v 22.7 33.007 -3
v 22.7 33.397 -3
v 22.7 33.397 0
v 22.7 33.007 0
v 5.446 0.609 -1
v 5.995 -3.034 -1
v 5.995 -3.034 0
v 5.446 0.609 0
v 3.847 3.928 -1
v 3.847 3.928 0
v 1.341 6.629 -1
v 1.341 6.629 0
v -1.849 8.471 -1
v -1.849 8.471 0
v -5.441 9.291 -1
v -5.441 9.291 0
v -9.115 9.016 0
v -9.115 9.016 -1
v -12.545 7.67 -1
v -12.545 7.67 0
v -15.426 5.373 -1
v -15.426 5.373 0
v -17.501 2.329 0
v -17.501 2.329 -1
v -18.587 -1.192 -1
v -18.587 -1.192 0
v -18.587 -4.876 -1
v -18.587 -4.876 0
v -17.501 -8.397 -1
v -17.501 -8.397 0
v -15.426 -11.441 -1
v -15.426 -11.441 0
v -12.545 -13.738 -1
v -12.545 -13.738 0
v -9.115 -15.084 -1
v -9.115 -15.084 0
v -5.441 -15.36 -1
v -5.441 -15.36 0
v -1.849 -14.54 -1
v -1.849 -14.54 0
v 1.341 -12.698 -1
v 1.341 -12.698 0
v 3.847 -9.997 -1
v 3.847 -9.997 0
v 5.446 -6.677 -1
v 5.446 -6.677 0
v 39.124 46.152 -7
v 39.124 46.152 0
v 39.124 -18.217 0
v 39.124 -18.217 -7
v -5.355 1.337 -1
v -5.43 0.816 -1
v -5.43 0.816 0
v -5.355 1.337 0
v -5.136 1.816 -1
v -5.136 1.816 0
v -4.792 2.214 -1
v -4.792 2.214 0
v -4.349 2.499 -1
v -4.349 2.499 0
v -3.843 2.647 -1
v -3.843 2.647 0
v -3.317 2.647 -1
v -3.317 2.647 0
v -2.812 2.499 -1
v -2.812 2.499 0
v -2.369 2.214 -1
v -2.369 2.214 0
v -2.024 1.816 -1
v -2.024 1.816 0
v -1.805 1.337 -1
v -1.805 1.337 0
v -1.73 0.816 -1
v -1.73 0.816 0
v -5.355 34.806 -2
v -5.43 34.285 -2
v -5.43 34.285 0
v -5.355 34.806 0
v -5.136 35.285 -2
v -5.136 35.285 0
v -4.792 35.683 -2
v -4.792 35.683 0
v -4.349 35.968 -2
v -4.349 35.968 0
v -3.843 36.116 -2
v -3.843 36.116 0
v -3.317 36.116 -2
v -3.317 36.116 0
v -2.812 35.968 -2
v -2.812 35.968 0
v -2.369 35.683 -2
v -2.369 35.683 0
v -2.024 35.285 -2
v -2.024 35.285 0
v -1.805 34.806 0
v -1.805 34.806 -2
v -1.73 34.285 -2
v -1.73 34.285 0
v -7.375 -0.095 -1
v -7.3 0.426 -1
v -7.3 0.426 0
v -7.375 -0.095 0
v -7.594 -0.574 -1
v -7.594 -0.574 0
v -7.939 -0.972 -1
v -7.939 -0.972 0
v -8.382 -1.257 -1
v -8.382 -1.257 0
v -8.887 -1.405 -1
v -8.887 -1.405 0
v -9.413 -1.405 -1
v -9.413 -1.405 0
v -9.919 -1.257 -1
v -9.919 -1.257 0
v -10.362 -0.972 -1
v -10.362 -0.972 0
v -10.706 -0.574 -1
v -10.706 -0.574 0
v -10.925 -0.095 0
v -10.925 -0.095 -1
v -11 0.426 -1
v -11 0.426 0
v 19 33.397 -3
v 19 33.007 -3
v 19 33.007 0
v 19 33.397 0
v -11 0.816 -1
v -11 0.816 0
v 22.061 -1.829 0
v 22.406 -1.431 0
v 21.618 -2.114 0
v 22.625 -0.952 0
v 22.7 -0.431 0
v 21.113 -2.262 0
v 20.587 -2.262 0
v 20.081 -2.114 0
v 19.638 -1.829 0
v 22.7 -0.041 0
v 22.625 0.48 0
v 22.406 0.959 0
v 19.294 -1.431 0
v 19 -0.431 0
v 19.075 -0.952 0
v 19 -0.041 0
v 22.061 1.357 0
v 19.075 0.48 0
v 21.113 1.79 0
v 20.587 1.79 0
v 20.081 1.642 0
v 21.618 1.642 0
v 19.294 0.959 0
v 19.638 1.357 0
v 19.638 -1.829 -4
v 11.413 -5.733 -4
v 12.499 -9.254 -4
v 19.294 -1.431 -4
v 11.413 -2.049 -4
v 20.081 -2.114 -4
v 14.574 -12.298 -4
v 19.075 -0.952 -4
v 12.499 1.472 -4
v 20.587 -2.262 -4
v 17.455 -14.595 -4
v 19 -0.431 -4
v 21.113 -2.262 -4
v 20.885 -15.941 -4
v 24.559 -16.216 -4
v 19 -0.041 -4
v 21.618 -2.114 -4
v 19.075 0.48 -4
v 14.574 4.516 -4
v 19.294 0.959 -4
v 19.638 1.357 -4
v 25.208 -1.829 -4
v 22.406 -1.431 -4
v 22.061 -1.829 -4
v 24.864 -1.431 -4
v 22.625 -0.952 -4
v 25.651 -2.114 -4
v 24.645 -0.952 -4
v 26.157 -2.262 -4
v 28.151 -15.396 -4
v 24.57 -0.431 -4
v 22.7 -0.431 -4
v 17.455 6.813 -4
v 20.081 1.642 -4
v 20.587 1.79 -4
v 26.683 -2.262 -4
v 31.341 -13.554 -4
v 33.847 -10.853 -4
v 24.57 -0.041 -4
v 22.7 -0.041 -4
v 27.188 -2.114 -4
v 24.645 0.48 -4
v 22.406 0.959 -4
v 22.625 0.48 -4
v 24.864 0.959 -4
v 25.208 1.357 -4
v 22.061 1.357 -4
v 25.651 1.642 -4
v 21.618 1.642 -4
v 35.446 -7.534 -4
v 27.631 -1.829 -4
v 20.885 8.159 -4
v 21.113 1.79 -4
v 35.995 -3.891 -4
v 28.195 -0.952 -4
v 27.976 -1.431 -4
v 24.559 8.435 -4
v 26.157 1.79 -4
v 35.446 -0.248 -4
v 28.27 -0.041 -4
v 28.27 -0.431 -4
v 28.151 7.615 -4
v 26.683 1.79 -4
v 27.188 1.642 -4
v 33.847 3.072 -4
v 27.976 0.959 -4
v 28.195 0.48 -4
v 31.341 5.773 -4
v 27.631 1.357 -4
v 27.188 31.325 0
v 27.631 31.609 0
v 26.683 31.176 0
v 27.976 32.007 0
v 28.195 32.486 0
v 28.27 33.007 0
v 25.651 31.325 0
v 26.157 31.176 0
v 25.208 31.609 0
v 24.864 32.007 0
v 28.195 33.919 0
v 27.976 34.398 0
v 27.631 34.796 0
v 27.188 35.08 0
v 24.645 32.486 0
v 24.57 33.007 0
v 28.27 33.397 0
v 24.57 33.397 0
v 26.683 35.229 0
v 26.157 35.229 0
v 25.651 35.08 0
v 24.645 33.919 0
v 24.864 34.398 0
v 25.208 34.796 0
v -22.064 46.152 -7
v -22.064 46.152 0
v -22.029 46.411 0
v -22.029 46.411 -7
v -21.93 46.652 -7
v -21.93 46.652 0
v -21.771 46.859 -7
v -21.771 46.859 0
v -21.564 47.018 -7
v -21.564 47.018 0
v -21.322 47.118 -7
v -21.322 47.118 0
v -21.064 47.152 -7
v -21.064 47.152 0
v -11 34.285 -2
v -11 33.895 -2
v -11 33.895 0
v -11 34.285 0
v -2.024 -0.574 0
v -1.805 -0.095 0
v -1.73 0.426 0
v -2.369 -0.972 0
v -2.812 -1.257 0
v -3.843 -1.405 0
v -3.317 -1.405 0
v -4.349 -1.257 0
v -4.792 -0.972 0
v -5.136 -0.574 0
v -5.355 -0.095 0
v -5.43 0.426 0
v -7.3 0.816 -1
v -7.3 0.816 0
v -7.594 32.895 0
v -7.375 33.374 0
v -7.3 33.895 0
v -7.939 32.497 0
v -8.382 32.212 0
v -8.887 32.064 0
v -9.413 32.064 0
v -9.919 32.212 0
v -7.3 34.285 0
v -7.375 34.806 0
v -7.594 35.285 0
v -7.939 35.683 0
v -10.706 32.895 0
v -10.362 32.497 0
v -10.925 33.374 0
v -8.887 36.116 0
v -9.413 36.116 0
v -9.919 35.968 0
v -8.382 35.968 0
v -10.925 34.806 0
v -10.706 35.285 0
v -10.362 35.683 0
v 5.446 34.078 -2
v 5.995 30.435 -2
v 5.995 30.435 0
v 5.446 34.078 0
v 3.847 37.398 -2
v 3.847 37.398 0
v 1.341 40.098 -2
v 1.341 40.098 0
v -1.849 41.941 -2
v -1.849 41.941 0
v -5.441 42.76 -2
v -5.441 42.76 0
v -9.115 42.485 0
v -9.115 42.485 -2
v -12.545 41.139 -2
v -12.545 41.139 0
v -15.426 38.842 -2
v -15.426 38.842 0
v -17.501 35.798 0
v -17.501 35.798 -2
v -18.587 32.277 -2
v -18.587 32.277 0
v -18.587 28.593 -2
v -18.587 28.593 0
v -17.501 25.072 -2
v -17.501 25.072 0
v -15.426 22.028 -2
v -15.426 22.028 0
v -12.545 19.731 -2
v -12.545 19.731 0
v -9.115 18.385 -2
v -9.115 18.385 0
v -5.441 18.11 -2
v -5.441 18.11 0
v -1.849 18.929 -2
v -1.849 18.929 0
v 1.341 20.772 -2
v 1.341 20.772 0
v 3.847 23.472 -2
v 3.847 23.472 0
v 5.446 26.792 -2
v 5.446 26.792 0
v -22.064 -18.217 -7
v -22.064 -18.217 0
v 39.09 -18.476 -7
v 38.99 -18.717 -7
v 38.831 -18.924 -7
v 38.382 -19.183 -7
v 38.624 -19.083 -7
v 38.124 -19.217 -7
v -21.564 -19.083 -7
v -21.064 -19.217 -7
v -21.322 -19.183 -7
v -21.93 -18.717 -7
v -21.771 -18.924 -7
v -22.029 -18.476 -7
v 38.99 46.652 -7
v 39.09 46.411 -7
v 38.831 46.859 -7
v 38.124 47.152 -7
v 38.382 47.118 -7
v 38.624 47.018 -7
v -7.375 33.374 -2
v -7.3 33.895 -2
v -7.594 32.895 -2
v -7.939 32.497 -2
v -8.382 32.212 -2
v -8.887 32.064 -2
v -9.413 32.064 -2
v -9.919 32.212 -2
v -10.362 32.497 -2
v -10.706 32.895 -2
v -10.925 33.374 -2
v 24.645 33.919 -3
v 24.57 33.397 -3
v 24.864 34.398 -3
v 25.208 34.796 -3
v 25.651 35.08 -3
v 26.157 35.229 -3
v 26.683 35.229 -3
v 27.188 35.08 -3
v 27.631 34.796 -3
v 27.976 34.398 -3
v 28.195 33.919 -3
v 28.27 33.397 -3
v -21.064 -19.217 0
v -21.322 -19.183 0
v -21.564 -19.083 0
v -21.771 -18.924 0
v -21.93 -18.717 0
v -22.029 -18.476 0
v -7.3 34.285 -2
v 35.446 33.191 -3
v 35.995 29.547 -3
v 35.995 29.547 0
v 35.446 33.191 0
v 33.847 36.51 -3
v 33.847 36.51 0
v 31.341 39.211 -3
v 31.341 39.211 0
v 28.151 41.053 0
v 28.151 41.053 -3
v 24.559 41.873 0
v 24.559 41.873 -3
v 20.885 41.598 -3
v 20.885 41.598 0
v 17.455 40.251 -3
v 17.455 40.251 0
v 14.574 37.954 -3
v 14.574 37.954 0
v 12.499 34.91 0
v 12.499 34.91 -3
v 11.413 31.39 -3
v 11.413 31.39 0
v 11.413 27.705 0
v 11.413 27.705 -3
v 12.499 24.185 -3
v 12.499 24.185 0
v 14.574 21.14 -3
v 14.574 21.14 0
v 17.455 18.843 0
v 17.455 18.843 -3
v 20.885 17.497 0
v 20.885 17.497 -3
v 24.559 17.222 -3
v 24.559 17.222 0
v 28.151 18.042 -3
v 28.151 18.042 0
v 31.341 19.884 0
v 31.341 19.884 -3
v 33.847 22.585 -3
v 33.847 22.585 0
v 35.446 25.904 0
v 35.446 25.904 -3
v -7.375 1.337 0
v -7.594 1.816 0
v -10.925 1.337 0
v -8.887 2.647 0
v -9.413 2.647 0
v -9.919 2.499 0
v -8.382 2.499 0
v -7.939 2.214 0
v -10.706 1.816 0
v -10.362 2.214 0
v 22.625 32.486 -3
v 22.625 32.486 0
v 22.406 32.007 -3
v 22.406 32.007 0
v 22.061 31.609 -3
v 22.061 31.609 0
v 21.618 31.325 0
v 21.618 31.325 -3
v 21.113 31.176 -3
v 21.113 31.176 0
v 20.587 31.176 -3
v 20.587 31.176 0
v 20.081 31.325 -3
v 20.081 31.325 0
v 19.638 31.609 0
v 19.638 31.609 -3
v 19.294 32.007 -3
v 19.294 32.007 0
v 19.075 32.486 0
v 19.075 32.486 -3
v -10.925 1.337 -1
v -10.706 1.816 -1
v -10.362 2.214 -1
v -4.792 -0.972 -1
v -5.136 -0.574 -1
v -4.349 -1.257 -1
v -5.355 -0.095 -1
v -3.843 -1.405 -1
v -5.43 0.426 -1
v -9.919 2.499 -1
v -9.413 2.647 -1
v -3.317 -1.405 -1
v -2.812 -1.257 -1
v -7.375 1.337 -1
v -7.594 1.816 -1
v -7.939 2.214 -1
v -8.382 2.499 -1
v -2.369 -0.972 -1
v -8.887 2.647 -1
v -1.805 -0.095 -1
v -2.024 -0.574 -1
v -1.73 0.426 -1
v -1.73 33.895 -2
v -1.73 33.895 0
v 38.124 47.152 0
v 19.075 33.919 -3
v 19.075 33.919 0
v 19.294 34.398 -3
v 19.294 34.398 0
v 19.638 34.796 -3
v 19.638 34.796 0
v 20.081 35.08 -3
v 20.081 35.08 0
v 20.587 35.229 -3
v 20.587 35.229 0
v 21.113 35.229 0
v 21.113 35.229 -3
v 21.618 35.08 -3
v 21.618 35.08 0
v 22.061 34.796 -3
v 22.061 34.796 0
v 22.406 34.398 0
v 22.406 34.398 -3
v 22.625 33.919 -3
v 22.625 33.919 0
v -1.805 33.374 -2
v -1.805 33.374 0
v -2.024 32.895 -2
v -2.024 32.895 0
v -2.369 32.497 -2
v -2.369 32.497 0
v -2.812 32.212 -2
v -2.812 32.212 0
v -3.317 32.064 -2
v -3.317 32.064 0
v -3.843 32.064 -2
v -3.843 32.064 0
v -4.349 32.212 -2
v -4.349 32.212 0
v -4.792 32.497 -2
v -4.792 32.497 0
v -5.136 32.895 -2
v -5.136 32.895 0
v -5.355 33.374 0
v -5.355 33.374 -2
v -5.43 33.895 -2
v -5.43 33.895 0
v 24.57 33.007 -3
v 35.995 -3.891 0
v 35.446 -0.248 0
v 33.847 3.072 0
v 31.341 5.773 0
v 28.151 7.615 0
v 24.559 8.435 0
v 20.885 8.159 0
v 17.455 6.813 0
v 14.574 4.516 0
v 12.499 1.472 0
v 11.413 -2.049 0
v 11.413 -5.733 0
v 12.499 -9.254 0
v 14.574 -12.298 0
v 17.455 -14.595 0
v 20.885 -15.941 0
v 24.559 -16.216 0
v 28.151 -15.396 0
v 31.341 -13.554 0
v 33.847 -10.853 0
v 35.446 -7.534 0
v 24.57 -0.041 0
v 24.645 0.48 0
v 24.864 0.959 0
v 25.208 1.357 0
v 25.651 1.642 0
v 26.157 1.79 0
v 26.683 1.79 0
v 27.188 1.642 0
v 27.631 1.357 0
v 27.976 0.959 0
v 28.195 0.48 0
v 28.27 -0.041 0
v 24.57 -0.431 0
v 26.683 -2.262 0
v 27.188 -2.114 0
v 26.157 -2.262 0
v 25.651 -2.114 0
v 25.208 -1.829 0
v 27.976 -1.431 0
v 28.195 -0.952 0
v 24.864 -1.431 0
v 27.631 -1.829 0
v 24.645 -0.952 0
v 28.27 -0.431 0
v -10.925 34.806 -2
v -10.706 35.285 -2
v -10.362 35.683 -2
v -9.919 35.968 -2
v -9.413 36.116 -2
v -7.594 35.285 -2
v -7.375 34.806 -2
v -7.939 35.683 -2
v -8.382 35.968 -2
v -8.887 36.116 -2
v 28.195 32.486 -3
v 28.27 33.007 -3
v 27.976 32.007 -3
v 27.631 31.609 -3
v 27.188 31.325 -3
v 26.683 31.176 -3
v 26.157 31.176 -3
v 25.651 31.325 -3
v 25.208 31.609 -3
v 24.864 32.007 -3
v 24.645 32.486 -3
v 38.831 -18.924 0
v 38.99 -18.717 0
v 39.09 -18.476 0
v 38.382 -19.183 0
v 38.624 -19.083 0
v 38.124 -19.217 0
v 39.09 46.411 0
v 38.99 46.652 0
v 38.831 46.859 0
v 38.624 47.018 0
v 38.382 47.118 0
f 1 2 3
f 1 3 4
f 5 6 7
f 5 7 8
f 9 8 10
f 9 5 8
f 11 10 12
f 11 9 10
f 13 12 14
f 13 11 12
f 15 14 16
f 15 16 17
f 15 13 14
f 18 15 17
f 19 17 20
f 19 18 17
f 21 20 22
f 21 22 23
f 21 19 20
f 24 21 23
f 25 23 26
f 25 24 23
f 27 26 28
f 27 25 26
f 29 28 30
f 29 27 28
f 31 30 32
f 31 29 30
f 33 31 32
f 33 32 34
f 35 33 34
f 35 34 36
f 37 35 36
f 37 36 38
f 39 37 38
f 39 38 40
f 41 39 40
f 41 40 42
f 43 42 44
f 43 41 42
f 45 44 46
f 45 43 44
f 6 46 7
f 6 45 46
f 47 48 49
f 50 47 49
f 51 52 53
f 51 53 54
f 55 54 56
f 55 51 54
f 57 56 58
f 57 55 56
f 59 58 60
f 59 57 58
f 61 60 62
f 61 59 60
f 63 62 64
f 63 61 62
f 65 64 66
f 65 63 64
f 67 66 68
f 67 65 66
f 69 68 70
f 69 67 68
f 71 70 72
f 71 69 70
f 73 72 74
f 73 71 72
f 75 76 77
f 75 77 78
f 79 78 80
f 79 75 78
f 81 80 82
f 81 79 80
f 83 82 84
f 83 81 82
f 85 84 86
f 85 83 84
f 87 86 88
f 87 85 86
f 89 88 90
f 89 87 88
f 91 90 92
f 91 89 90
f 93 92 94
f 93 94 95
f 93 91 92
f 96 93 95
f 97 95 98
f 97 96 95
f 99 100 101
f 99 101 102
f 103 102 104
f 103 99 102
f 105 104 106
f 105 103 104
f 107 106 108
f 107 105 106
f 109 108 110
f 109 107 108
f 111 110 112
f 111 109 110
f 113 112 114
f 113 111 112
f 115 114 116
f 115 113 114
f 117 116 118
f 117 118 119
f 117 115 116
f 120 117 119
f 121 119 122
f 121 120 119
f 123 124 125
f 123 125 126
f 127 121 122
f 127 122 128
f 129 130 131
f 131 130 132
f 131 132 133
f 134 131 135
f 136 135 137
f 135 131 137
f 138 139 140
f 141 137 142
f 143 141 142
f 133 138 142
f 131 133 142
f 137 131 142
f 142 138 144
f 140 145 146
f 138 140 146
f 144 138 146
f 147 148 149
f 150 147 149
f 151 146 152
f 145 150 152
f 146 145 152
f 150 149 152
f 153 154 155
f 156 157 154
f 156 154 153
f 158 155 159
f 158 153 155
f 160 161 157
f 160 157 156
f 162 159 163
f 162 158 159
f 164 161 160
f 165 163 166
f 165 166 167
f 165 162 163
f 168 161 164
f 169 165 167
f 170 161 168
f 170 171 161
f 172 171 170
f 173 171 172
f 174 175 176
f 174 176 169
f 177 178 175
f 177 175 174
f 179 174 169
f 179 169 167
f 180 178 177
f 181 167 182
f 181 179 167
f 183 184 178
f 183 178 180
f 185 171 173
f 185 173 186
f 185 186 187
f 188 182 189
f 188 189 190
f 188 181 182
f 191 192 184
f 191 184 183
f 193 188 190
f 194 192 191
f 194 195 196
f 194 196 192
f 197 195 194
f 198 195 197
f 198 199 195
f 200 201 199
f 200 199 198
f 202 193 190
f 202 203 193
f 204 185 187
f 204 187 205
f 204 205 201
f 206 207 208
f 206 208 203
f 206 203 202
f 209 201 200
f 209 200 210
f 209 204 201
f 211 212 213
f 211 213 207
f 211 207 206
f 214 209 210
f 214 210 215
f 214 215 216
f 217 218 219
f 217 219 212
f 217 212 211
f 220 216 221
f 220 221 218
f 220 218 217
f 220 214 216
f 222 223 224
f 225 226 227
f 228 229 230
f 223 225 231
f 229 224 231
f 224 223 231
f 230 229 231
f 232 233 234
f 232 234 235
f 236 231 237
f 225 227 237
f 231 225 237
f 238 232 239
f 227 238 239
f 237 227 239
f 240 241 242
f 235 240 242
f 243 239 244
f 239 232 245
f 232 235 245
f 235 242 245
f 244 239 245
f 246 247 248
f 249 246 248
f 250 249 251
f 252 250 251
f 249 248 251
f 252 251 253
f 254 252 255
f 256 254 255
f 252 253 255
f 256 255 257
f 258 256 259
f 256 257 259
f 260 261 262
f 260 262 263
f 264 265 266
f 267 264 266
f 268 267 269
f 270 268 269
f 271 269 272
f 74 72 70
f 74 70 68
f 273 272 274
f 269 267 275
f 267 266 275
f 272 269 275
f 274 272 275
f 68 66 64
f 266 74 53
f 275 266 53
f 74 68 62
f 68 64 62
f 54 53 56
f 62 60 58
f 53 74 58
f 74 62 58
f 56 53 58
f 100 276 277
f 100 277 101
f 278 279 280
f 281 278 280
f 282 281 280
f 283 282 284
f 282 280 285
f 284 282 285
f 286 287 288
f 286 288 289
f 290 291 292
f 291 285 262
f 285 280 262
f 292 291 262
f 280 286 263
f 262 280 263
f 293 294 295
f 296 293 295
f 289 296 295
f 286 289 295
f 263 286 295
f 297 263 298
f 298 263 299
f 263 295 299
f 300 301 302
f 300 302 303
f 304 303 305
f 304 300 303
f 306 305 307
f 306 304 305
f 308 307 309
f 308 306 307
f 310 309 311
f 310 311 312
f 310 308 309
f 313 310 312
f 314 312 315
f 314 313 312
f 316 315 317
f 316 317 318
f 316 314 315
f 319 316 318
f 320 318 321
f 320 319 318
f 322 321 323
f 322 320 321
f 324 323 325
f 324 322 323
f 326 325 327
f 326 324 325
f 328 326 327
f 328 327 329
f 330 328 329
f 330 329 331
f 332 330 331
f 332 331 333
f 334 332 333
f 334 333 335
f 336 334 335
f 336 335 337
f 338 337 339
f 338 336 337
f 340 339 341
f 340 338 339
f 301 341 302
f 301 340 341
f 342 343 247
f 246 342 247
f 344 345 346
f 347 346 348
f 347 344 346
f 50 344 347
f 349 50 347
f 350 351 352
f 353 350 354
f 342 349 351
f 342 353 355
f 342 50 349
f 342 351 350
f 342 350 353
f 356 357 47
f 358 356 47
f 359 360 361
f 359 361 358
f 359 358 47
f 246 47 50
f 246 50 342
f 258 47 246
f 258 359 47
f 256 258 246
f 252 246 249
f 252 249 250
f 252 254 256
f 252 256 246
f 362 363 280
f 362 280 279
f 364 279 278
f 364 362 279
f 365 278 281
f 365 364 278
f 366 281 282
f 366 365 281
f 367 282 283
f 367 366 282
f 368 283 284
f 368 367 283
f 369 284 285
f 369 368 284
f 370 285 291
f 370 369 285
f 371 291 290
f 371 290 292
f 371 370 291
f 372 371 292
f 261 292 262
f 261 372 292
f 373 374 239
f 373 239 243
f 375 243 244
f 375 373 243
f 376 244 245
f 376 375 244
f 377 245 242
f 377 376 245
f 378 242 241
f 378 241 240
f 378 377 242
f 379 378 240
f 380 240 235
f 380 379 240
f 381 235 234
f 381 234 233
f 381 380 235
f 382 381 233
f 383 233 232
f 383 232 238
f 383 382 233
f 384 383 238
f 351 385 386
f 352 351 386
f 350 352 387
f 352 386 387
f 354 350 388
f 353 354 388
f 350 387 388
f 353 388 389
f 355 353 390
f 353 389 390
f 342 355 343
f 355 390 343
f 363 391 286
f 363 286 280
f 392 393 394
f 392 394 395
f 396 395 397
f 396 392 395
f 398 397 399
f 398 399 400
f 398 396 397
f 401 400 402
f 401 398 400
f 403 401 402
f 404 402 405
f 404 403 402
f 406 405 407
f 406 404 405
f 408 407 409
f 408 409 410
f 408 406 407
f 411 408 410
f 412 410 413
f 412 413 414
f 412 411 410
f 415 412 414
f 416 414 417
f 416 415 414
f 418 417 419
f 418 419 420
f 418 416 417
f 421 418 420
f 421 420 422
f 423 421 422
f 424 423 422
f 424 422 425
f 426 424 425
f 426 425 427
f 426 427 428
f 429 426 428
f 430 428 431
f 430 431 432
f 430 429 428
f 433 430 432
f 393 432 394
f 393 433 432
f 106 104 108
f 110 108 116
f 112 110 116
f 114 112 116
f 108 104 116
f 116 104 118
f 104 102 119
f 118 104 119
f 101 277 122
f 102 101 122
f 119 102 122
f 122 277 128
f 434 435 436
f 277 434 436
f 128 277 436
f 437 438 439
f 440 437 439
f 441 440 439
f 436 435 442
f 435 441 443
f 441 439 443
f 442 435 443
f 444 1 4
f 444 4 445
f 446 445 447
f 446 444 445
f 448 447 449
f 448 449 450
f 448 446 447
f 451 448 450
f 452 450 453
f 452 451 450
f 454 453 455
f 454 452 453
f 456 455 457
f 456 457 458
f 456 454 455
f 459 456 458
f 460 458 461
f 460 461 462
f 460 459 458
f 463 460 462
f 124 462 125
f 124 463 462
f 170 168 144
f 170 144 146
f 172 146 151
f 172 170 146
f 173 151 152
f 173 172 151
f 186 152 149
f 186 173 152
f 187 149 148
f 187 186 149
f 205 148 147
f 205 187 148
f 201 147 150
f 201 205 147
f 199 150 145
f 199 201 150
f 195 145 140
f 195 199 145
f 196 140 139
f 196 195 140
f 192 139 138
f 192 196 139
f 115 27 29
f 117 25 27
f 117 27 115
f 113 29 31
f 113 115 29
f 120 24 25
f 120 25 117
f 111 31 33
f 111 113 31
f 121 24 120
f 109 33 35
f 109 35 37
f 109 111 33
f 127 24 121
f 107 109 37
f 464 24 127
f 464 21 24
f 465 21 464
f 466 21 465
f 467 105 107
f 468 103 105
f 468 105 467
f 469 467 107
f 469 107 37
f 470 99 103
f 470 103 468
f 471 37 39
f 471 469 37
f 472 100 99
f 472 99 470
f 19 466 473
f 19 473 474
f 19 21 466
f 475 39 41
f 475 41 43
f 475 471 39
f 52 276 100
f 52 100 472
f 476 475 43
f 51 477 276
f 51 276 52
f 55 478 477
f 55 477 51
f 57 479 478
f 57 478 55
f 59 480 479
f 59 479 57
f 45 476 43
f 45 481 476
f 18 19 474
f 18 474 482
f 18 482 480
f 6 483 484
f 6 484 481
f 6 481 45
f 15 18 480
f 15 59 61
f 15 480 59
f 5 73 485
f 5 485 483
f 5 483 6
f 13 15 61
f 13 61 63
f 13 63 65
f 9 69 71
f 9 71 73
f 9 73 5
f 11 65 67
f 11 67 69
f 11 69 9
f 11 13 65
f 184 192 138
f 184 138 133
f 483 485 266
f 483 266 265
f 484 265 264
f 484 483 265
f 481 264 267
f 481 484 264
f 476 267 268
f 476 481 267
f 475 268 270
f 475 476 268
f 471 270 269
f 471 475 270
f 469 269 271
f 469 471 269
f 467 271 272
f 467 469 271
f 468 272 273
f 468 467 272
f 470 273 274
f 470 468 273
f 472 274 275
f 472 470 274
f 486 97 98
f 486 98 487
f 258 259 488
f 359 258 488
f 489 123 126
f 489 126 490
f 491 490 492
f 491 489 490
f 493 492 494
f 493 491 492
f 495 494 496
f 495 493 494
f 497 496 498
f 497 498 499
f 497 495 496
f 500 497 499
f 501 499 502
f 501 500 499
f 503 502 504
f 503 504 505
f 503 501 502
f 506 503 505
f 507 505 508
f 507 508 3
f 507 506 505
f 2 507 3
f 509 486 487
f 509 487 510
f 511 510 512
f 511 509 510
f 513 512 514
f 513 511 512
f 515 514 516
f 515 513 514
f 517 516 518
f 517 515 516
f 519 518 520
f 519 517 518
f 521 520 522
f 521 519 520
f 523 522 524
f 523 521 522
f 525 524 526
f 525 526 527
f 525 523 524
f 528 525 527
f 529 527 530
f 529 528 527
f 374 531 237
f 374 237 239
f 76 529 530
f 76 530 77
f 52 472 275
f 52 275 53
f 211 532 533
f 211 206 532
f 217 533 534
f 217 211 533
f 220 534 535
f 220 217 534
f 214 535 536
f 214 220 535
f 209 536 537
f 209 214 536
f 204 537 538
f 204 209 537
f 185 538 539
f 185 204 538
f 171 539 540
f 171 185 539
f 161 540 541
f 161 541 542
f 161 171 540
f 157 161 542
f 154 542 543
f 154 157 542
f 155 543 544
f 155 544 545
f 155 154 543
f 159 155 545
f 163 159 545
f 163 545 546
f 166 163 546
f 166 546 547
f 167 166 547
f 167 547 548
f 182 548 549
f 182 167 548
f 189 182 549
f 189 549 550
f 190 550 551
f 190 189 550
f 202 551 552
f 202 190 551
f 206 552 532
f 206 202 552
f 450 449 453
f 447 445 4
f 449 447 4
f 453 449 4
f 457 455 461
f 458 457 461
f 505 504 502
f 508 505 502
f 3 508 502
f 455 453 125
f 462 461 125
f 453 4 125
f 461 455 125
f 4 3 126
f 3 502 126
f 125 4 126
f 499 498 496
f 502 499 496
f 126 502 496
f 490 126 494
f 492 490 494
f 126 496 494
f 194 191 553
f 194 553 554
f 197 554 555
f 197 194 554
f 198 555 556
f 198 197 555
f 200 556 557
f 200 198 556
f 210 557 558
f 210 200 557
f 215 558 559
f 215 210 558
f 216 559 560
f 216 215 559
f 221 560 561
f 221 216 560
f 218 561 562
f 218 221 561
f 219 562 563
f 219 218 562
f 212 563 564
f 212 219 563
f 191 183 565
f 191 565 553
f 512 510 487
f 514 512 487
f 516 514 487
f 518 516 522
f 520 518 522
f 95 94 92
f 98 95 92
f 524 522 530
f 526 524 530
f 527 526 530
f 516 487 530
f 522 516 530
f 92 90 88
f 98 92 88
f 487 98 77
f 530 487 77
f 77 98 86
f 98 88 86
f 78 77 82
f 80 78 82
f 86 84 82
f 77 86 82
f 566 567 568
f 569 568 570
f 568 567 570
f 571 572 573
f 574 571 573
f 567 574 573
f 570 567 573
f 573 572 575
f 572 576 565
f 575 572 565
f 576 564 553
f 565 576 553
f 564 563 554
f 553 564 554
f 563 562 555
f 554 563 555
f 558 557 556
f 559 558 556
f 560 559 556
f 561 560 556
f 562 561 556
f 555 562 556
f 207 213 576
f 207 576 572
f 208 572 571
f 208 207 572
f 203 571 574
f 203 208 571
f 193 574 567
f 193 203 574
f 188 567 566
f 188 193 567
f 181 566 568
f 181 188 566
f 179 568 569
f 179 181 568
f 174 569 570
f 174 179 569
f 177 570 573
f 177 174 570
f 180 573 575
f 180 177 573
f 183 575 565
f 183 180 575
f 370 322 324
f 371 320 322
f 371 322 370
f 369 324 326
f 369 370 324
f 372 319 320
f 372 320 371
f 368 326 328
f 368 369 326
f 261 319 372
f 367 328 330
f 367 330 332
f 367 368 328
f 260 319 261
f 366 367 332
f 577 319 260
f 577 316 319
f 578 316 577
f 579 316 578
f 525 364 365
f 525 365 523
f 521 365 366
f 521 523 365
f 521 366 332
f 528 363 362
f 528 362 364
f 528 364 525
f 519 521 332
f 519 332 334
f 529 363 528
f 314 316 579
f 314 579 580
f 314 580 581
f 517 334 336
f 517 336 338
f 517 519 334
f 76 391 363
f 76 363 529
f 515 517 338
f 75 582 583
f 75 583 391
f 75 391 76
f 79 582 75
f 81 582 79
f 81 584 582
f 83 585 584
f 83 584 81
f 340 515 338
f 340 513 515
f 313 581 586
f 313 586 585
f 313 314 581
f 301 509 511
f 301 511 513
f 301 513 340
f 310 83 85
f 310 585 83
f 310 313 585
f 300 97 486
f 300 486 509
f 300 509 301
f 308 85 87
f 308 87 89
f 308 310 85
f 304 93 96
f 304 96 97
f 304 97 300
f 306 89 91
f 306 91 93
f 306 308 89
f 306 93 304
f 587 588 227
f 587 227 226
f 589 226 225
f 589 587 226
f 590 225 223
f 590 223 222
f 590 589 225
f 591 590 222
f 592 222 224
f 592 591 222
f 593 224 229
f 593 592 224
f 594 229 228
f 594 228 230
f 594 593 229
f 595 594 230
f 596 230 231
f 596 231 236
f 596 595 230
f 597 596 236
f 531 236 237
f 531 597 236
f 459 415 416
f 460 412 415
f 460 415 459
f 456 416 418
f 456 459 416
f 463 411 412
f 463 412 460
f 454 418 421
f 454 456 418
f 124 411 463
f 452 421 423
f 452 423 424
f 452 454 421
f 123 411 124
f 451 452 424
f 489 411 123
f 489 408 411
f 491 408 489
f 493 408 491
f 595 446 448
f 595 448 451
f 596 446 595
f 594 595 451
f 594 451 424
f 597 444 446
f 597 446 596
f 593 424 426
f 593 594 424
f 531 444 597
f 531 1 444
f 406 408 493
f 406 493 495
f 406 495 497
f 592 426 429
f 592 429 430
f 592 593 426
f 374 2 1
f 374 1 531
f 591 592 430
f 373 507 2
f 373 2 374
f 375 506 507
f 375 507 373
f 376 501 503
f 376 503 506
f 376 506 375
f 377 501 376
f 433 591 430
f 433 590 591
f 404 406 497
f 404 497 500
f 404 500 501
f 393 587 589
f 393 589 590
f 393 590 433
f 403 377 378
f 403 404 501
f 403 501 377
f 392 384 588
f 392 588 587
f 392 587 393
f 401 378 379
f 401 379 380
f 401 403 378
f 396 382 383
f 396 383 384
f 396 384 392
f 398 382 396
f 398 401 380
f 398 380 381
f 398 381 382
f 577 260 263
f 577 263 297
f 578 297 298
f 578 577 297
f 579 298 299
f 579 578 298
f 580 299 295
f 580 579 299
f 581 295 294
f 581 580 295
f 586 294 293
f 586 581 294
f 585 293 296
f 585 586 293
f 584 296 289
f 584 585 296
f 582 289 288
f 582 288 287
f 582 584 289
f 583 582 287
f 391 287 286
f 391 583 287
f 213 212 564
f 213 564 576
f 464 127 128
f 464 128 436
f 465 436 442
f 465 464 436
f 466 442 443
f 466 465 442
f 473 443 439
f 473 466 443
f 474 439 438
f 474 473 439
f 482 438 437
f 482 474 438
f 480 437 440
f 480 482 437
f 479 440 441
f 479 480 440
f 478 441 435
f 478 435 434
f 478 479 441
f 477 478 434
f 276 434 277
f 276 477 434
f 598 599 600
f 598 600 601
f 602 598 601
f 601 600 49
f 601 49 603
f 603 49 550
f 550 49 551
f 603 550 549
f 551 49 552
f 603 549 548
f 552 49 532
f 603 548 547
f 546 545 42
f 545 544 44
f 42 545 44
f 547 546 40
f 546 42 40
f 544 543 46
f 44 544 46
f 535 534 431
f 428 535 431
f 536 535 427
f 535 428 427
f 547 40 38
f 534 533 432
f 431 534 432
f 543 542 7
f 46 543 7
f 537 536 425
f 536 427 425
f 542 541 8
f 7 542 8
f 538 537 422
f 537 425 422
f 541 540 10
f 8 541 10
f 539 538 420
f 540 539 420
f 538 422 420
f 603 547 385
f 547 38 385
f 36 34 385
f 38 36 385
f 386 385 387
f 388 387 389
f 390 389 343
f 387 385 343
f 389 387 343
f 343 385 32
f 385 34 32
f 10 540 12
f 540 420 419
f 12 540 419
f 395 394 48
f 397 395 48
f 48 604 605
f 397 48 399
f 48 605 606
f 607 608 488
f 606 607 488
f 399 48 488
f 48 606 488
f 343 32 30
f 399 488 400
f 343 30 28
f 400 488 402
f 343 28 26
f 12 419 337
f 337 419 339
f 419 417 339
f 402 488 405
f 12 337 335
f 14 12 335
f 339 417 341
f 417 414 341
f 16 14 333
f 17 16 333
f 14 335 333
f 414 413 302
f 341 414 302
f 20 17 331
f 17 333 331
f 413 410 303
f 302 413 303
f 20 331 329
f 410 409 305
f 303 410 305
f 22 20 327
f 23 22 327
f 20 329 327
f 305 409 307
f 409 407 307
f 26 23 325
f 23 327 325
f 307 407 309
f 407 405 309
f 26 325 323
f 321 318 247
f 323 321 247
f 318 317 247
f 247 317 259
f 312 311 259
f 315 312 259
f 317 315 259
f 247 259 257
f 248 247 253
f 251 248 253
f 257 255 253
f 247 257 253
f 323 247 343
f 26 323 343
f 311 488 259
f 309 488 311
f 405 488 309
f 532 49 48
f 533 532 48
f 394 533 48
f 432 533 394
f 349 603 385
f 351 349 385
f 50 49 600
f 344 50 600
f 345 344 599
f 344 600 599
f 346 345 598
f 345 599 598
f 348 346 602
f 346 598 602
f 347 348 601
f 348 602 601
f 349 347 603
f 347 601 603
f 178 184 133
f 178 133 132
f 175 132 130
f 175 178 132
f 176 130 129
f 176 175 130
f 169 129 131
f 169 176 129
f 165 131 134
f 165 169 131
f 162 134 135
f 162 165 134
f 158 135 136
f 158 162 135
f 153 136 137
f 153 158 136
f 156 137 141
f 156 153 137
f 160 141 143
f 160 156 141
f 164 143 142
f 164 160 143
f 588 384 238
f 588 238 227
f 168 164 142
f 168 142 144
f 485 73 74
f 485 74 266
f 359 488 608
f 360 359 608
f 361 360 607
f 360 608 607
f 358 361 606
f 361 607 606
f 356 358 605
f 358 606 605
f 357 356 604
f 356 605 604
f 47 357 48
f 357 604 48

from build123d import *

# Parameters (mm, degrees)
BOSS_EXTRUDE1_DEPTH = 7
CAVITY1_START       = -3
CAVITY1_OUTLINE_R   = 12.36
CAVITY1_DEPTH       = 3
CAVITY1_START_2     = -2
CAVITY1_2_OUTLINE_R = 12.36
CAVITY1_2_DEPTH     = 2
CAVITY1_START_3     = -4
CAVITY1_3_OUTLINE_R = 12.36
CAVITY1_3_DEPTH     = 1
CAVITY1_START_4     = -1
CAVITY1_4_OUTLINE_R = 12.36
CAVITY1_4_DEPTH     = 1


# Read off the part's stored shape, not the designer's step: Cavity1
with BuildPart() as part:
    # Sketch1 → Boss-Extrude1 (new body)
    with BuildSketch(Plane.XY):
        with BuildLine():
            Line((38.123582206, -19.216804324), (-21.063563238, -19.216804324))
            ThreePointArc((-21.063563238, -19.216804324), (-21.770670019, -18.923911105), (-22.063563238, -18.216804324))
            Line((-22.063563238, -18.216804324), (-22.063563238, 46.15189529))
            ThreePointArc((-22.063563238, 46.15189529), (-21.770670019, 46.859002071), (-21.063563238, 47.15189529))
            Line((-21.063563238, 47.15189529), (38.123582206, 47.15189529))
            ThreePointArc((38.123582206, 47.15189529), (38.830688987, 46.859002071), (39.123582206, 46.15189529))
            Line((39.123582206, 46.15189529), (39.123582206, -18.216804324))
            ThreePointArc((39.123582206, -18.216804324), (38.830688987, -18.923911105), (38.123582206, -19.216804324))
        make_face()
    extrude(amount=-BOSS_EXTRUDE1_DEPTH)

    # Cavity1 outline → Cavity1 (cut)
    # profile 1 of 2: a face of its own
    with BuildSketch(Plane.XY.offset(CAVITY1_START)):
        with Locations((23.634896534, -3.890788044)):
            Circle(CAVITY1_OUTLINE_R)
        with BuildLine():
            ThreePointArc((18.999896534, -0.040788044), (20.849896534, 1.809211956), (22.699896534, -0.040788044))
            Line((22.699896534, -0.040788044), (22.699896534, -0.430788044))
            ThreePointArc((22.699896534, -0.430788044), (20.849896534, -2.280788044), (18.999896534, -0.430788044))
            Line((18.999896534, -0.430788044), (18.999896534, -0.040788044))
        make_face(mode=Mode.SUBTRACT)
        with BuildLine():
            ThreePointArc((24.569896534, -0.040788044), (26.419896534, 1.809211956), (28.269896534, -0.040788044))
            Line((28.269896534, -0.040788044), (28.269896534, -0.430788044))
            ThreePointArc((28.269896534, -0.430788044), (26.419896534, -2.280788044), (24.569896534, -0.430788044))
            Line((24.569896534, -0.430788044), (24.569896534, -0.040788044))
        make_face(mode=Mode.SUBTRACT)
    # profile 2 of 2: a face of its own
    with BuildSketch(Plane.XY.offset(CAVITY1_START)):
        with Locations((23.634896534, 29.54740971)):
            Circle(CAVITY1_OUTLINE_R)
        with BuildLine():
            Line((22.699896534, 33.39740971), (22.699896534, 33.00740971))
            ThreePointArc((22.699896534, 33.00740971), (20.849896534, 31.15740971), (18.999896534, 33.00740971))
            Line((18.999896534, 33.00740971), (18.999896534, 33.39740971))
            ThreePointArc((18.999896534, 33.39740971), (20.849896534, 35.24740971), (22.699896534, 33.39740971))
        make_face(mode=Mode.SUBTRACT)
        with BuildLine():
            Line((28.269896534, 33.39740971), (28.269896534, 33.00740971))
            ThreePointArc((28.269896534, 33.00740971), (26.419896534, 31.15740971), (24.569896534, 33.00740971))
            Line((24.569896534, 33.00740971), (24.569896534, 33.39740971))
            ThreePointArc((24.569896534, 33.39740971), (26.419896534, 35.24740971), (28.269896534, 33.39740971))
        make_face(mode=Mode.SUBTRACT)
    extrude(amount=CAVITY1_DEPTH, mode=Mode.SUBTRACT)

    # Cavity1 2 outline → Cavity1 2 (cut)
    with BuildSketch(Plane.XY.offset(CAVITY1_START_2)):
        with Locations((-6.365103466, 30.435007788)):
            Circle(CAVITY1_2_OUTLINE_R)
        with BuildLine():
            ThreePointArc((-11.000103466, 34.285007788), (-9.150103466, 36.135007788), (-7.300103466, 34.285007788))
            Line((-7.300103466, 34.285007788), (-7.300103466, 33.895007788))
            ThreePointArc((-7.300103466, 33.895007788), (-9.150103466, 32.045007788), (-11.000103466, 33.895007788))
            Line((-11.000103466, 33.895007788), (-11.000103466, 34.285007788))
        make_face(mode=Mode.SUBTRACT)
        with BuildLine():
            ThreePointArc((-5.430103466, 34.285007788), (-3.580103466, 36.135007788), (-1.730103466, 34.285007788))
            Line((-1.730103466, 34.285007788), (-1.730103466, 33.895007788))
            ThreePointArc((-1.730103466, 33.895007788), (-3.580103466, 32.045007788), (-5.430103466, 33.895007788))
            Line((-5.430103466, 33.895007788), (-5.430103466, 34.285007788))
        make_face(mode=Mode.SUBTRACT)
    extrude(amount=CAVITY1_2_DEPTH, mode=Mode.SUBTRACT)

    # Cavity1 3 outline → Cavity1 3 (cut)
    with BuildSketch(Plane.XY.offset(CAVITY1_START_3)):
        with Locations((23.634896534, -3.890788044)):
            Circle(CAVITY1_3_OUTLINE_R)
        with BuildLine():
            ThreePointArc((18.999896534, -0.040788044), (20.849896534, 1.809211956), (22.699896534, -0.040788044))
            Line((22.699896534, -0.040788044), (22.699896534, -0.430788044))
            ThreePointArc((22.699896534, -0.430788044), (20.849896534, -2.280788044), (18.999896534, -0.430788044))
            Line((18.999896534, -0.430788044), (18.999896534, -0.040788044))
        make_face(mode=Mode.SUBTRACT)
        with BuildLine():
            ThreePointArc((24.569896534, -0.040788044), (26.419896534, 1.809211956), (28.269896534, -0.040788044))
            Line((28.269896534, -0.040788044), (28.269896534, -0.430788044))
            ThreePointArc((28.269896534, -0.430788044), (26.419896534, -2.280788044), (24.569896534, -0.430788044))
            Line((24.569896534, -0.430788044), (24.569896534, -0.040788044))
        make_face(mode=Mode.SUBTRACT)
    extrude(amount=CAVITY1_3_DEPTH, mode=Mode.SUBTRACT)

    # Cavity1 4 outline → Cavity1 4 (cut)
    with BuildSketch(Plane.XY.offset(CAVITY1_START_4)):
        with Locations((-6.365103466, -3.03425393)):
            Circle(CAVITY1_4_OUTLINE_R)
        with BuildLine():
            Line((-7.300103466, 0.81574607), (-7.300103466, 0.42574607))
            ThreePointArc((-7.300103466, 0.42574607), (-9.150103466, -1.42425393), (-11.000103466, 0.42574607))
            Line((-11.000103466, 0.42574607), (-11.000103466, 0.81574607))
            ThreePointArc((-11.000103466, 0.81574607), (-9.150103466, 2.66574607), (-7.300103466, 0.81574607))
        make_face(mode=Mode.SUBTRACT)
        with BuildLine():
            Line((-1.730103466, 0.81574607), (-1.730103466, 0.42574607))
            ThreePointArc((-1.730103466, 0.42574607), (-3.580103466, -1.42425393), (-5.430103466, 0.42574607))
            Line((-5.430103466, 0.42574607), (-5.430103466, 0.81574607))
            ThreePointArc((-5.430103466, 0.81574607), (-3.580103466, 2.66574607), (-1.730103466, 0.81574607))
        make_face(mode=Mode.SUBTRACT)
    extrude(amount=CAVITY1_4_DEPTH, mode=Mode.SUBTRACT)


solid = part.part
